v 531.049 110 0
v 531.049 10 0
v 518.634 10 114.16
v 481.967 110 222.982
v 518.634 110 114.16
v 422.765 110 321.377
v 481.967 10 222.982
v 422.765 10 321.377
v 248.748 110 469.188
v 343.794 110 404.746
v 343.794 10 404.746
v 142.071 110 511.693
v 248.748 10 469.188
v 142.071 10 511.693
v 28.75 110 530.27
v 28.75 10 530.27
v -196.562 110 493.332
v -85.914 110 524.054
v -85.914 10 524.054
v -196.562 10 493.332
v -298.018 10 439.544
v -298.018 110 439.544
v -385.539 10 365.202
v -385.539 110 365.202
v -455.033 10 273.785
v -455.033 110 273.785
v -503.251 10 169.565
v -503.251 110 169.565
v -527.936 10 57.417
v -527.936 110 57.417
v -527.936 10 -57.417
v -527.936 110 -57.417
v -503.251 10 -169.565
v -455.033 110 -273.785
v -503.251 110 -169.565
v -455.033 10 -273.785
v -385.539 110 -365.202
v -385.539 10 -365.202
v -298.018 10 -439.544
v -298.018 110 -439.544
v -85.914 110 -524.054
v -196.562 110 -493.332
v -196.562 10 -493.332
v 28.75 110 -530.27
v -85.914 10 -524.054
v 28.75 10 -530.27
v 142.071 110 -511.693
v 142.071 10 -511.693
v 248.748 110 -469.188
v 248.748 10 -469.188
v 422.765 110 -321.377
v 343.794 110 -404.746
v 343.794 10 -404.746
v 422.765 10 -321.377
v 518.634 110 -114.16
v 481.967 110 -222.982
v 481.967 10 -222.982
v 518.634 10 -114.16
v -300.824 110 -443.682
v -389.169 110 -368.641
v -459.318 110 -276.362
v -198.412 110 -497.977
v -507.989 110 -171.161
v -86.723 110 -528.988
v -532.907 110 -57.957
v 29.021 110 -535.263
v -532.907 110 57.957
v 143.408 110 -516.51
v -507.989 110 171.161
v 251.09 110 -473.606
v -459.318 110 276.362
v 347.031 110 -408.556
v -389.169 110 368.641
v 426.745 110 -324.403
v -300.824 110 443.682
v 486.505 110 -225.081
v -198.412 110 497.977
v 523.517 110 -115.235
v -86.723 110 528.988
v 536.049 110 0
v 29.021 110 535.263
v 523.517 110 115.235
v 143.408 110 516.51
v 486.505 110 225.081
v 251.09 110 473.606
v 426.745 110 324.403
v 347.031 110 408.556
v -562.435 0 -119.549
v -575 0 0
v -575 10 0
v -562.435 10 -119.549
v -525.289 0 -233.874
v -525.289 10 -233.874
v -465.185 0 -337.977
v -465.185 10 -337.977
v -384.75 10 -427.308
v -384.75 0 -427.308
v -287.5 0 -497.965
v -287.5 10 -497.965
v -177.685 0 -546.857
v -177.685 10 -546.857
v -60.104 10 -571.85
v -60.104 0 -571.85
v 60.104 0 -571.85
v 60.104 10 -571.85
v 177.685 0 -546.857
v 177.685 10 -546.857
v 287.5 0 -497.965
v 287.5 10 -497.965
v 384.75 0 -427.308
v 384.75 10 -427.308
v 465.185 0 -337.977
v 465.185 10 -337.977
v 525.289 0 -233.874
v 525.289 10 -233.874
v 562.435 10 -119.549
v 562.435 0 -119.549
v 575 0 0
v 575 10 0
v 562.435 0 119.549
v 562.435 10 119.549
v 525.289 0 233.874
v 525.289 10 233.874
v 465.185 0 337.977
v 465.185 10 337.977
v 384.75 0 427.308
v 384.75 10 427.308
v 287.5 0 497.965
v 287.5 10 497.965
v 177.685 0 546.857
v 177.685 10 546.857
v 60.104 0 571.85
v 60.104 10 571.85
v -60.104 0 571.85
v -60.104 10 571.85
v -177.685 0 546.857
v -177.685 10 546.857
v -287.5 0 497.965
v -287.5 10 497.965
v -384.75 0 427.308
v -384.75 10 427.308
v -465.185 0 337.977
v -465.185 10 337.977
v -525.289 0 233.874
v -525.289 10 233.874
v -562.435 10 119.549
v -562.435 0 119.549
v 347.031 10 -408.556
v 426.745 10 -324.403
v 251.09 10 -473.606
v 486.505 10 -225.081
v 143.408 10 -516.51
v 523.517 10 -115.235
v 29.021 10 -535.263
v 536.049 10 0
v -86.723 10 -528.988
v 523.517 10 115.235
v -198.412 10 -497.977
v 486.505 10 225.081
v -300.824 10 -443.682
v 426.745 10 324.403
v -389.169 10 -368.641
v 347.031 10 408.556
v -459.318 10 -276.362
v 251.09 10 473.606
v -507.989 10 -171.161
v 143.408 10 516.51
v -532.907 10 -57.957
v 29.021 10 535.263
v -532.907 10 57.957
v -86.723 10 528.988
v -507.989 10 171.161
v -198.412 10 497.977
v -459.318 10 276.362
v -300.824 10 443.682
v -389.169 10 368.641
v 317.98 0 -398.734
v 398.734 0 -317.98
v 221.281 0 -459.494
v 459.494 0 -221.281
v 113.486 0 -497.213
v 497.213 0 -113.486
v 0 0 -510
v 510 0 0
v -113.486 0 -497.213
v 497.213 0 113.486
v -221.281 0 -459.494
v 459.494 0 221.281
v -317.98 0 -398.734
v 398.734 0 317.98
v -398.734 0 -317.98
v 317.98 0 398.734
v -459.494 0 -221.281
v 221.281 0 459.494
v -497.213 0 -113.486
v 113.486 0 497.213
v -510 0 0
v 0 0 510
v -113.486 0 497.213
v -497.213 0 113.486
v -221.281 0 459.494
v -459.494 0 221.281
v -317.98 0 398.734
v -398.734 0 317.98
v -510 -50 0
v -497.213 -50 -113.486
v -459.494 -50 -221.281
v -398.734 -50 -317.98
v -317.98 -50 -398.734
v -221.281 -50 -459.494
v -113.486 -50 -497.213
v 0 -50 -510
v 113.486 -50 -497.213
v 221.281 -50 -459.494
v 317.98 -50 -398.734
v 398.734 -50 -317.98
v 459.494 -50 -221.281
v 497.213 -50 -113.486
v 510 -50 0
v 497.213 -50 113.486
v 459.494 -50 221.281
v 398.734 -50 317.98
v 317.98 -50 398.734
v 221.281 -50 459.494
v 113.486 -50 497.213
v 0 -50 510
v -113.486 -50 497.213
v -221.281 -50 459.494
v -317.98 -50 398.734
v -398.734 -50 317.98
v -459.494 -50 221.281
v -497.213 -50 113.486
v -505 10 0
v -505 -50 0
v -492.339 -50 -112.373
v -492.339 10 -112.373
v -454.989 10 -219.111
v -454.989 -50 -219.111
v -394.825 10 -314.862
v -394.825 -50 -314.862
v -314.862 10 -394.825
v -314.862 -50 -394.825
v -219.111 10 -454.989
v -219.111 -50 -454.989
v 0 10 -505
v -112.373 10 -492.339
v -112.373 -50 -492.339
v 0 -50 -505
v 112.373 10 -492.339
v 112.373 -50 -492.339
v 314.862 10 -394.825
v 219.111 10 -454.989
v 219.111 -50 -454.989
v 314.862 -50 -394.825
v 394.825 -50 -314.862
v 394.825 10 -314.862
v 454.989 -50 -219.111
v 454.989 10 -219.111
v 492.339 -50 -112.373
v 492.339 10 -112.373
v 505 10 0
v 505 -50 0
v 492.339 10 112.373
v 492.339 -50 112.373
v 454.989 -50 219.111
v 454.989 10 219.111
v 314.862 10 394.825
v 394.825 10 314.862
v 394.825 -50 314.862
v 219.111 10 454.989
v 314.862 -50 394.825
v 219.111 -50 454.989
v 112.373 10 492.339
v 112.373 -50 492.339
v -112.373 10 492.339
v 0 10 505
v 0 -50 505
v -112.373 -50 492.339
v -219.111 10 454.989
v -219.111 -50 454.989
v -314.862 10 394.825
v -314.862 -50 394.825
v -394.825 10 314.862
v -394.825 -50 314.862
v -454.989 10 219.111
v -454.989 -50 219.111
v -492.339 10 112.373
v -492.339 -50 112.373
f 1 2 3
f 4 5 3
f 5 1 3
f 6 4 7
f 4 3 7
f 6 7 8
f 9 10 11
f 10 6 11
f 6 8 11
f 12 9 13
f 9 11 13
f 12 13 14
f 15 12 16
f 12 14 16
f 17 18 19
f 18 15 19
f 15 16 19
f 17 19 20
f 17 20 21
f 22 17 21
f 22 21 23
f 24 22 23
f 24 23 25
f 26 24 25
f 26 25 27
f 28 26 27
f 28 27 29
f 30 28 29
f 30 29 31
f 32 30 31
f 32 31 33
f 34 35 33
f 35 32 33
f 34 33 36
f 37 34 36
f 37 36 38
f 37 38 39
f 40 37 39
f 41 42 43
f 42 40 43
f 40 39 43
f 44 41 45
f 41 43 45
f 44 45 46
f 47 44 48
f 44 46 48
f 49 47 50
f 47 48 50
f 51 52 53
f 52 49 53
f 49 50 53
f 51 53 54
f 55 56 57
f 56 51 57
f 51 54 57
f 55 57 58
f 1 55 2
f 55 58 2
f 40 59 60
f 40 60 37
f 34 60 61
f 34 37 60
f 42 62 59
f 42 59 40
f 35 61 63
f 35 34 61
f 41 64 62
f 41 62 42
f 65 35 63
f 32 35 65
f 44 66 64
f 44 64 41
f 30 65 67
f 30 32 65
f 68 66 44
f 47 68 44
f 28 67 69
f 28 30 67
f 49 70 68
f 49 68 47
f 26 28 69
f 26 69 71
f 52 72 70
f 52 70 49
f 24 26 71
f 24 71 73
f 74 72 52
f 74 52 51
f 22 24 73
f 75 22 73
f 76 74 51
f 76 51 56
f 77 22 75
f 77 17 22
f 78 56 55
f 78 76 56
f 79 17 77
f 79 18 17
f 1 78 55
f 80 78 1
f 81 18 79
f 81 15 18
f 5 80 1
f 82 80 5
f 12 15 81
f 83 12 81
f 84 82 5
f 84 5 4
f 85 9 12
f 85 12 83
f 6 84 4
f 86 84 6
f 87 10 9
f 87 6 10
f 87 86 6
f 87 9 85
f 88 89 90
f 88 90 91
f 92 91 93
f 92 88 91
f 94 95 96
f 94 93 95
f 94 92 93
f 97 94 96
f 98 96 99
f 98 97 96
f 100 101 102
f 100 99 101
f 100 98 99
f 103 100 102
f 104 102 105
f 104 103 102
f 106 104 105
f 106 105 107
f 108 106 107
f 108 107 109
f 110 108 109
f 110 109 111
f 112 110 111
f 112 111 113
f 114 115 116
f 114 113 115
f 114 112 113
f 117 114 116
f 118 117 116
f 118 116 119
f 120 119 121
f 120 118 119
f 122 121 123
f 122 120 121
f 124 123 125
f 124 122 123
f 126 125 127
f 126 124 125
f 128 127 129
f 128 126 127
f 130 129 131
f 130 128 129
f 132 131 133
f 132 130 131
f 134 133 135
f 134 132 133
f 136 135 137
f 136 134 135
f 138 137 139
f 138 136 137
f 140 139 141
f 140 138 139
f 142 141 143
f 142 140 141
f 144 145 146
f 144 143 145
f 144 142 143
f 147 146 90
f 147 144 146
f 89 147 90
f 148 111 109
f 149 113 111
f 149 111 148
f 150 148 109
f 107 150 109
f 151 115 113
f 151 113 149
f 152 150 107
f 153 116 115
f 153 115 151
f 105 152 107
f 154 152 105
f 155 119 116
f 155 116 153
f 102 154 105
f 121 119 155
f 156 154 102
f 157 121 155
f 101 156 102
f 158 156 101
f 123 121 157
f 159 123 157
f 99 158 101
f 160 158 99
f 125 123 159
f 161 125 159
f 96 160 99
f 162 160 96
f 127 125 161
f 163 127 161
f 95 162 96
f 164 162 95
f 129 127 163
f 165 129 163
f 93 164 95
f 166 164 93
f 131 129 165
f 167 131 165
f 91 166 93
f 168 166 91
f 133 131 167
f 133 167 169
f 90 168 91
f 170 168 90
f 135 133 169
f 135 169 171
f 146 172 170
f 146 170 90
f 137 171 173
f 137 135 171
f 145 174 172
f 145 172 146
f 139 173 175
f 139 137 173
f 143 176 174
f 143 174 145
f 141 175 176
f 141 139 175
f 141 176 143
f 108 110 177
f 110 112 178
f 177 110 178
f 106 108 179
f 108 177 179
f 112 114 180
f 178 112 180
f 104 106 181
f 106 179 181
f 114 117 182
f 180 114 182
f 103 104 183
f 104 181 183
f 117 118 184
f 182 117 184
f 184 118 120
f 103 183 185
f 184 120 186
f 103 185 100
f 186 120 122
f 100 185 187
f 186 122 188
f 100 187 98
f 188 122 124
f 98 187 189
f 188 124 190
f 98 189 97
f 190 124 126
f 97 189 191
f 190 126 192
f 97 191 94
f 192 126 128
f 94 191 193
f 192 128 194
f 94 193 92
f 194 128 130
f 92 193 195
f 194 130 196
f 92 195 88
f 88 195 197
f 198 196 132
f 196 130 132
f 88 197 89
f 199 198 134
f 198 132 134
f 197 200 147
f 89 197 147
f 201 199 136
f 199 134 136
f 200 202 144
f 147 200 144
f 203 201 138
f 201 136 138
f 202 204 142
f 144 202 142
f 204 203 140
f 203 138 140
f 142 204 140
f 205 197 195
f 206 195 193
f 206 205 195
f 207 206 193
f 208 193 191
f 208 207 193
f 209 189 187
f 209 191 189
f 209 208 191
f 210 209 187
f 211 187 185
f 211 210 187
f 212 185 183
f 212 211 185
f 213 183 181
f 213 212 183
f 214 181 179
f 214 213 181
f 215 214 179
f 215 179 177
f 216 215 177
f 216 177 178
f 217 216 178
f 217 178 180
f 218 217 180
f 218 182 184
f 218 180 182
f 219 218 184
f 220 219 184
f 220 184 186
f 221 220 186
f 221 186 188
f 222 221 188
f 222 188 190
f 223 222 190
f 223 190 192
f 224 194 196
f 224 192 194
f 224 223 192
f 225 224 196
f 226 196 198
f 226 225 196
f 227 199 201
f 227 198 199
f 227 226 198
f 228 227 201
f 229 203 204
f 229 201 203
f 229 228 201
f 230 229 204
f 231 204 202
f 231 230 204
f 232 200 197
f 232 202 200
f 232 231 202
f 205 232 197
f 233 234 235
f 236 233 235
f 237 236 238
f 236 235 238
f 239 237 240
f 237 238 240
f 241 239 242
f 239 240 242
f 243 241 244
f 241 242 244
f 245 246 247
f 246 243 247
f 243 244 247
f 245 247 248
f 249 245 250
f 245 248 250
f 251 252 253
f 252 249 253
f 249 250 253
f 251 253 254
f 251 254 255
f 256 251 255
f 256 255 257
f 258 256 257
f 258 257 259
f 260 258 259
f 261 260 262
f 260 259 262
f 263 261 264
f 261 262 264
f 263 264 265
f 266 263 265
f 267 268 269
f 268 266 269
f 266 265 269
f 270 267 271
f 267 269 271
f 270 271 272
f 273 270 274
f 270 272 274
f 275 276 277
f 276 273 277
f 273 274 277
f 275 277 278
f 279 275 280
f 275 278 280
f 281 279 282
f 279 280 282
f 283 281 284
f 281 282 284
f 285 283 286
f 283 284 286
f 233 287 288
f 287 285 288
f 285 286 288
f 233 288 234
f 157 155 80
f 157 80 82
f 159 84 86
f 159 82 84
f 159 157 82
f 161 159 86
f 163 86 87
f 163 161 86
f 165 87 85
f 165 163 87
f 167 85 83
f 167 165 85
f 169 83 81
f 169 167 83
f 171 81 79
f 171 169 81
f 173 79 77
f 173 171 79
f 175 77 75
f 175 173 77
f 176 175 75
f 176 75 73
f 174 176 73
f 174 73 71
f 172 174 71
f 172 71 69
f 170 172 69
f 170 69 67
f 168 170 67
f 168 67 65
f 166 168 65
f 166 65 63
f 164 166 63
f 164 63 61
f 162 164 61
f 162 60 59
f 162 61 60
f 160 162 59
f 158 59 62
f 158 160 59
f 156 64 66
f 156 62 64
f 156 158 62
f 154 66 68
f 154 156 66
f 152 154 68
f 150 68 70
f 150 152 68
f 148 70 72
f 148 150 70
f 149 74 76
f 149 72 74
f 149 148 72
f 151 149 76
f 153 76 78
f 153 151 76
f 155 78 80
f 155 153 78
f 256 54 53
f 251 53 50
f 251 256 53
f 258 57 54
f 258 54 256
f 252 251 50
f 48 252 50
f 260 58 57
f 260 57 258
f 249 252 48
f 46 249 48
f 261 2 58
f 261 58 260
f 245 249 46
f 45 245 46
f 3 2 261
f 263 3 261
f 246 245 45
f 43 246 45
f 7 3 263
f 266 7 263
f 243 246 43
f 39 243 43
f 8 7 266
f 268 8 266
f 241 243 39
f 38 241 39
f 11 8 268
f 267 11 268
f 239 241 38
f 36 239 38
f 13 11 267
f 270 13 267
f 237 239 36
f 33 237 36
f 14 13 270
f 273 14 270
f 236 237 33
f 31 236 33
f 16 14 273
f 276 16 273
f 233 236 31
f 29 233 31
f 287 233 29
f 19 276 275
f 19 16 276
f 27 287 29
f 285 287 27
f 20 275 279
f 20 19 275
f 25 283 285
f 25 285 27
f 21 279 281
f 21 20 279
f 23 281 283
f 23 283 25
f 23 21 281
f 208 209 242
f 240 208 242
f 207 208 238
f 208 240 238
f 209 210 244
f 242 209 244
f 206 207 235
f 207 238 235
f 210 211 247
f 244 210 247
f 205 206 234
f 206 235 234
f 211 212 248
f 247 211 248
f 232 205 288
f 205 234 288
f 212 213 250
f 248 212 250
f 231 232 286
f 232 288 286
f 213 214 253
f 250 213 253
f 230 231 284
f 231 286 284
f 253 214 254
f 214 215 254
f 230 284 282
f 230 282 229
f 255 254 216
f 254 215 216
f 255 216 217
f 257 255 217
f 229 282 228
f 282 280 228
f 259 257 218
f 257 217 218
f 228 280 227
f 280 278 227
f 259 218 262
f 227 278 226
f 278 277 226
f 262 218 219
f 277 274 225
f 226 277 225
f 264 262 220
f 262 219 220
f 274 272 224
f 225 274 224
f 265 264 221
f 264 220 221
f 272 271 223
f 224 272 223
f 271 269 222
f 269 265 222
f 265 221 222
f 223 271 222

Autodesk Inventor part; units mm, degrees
ref_plane "YZ Plane" through (0, 0, 0) normal (1, 0, 0) x (0, 1, 0)
ref_plane "XZ Plane" through (0, 0, 0) normal (0, 1, 0) x (-1, 0, 0)
ref_plane "XY Plane" through (0, 0, 0) normal (0, 0, 1) x (1, 0, 0)
sketch "草图1" plane through (0, 0, 0) normal (0, 1, 0) x (-1, 0, 0)
  circle A0 centre (0, 0) radius 575
  circle A1 centre (0, 0) radius 510
  dimension "d0" = 1150
  dimension "d1" = 1020
extrude "拉伸1" add sketch "草图1" along normal blind 10
sketch "草图2" plane through (0, 0, 0) normal (0, 1, 0) x (-1, 0, 0)
  circle A0 centre (0, 0) radius 510 projected
surface extrude "拉伸曲面1" sketch "草图2" along normal blind 10 and the other way blind 50 shown no curves A0
thicken "加厚1" operation add thickness 5 both sides no extend neighbours no toward (0.7479816, 0, 0.6637194) faces at (-381.4706, 6.6667, -338.4969) (-381.4706, -30, -338.4969)
sketch "草图3" plane through (0, 10, 0) normal (0, 1, 0) x (1, 0, 0)
  circle A0 centre (0, 0) radius 575 projected
  circle A1 centre (0, 0) radius 536.0493
surface extrude "拉伸曲面2" sketch "草图3" along normal blind 100 shown no curves A1
thicken "加厚2" operation add thickness 5 both sides no extend neighbours no toward (-0.9991732, 0, -0.0406567) faces at (535.606, 76.6667, 21.794)
sketch "草图4" plane through (0, 110, 0) normal (0, 1, 0) x (1, 0, 0)
  circle A0 centre (0, 0) radius 536.0493 projected
  circle A1 centre (0, 0) radius 531.0493 projected
  line L0 (531.0493, 0) -> (505.0579, -164.1032)
  line L1 (505.0579, -164.1032) -> (429.6279, -312.1429)
  line L2 (429.6279, -312.1429) -> (312.1429, -429.6279)
  line L3 (312.1429, -429.6279) -> (164.1032, -505.0579)
  line L4 (164.1032, -505.0579) -> (0, -531.0493)
  line L5 (0, -531.0493) -> (-164.1032, -505.0579)
  line L6 (-164.1032, -505.0579) -> (-312.1429, -429.6279)
  line L7 (-312.1429, -429.6279) -> (-429.6279, -312.1429)
  line L8 (-429.6279, -312.1429) -> (-505.0579, -164.1032)
  line L9 (-505.0579, -164.1032) -> (-531.0493, 0)
  line L10 (-531.0493, 0) -> (-505.0579, 164.1032)
  line L11 (-505.0579, 164.1032) -> (-429.6279, 312.1429)
  line L12 (-429.6279, 312.1429) -> (-312.1429, 429.6279)
  line L13 (-312.1429, 429.6279) -> (-164.1032, 505.0579)
  line L14 (-164.1032, 505.0579) -> (0, 531.0493)
  line L15 (0, 531.0493) -> (164.1032, 505.0579)
  line L16 (164.1032, 505.0579) -> (312.1429, 429.6279)
  line L17 (312.1429, 429.6279) -> (429.6279, 312.1429)
  line L18 (429.6279, 312.1429) -> (505.0579, 164.1032)
  line L19 (505.0579, 164.1032) -> (531.0493, 0)
  line L20 (-531.0493, 0) -> (531.0493, 0)
  line L21 (-505.0579, 164.1032) -> (-505.0579, -164.1032)
  line L22 (-429.6279, 312.1429) -> (-429.6279, -312.1429)
  line L23 (-312.1429, 429.6279) -> (-312.1429, -429.6279)
  line L24 (-164.1032, 505.0579) -> (-164.1032, -505.0579)
  line L25 (0, 531.0493) -> (0, -531.0493)
  line L26 (164.1032, 505.0579) -> (164.1032, -505.0579)
  line L27 (312.1429, -429.6279) -> (312.1429, 429.6279)
  line L28 (429.6279, 312.1429) -> (429.6279, -312.1429)
  line L29 (505.0579, -164.1032) -> (505.0579, 164.1032)
  line L30 (-164.1032, 505.0579) -> (164.1032, 505.0579)
  line L31 (312.1429, 429.6279) -> (-312.1429, 429.6279)
  line L32 (-429.6279, 312.1429) -> (429.6279, 312.1429)
  line L33 (505.0579, 164.1032) -> (-505.0579, 164.1032)
  line L34 (-505.0579, -164.1032) -> (505.0579, -164.1032)
  line L35 (-429.6279, -312.1429) -> (429.6279, -312.1429)
  line L36 (312.1429, -429.6279) -> (-312.1429, -435.7931)
  line L37 (-164.1032, -505.0579) -> (164.1032, -505.0579)
  line L38 (-312.1429, 429.6279) -> (-505.0579, 164.1032)
  line L39 (-505.0579, -164.1032) -> (-312.1429, -435.7931)
  line L40 (0, -531.0493) -> (-312.1429, -435.7931)
  line L41 (0, -531.0493) -> (312.1429, -429.6279)
  line L42 (312.1429, -429.6279) -> (505.0579, -164.1032)
  line L43 (505.0579, 164.1032) -> (312.1429, 429.6279)
  line L44 (312.1429, 429.6279) -> (0, 531.0493)
  line L45 (531.0493, 0) -> (-312.1429, -435.7931)
  line L46 (-312.1429, 429.6279) -> (531.0493, 0)
  line L47 (312.1429, 429.6279) -> (164.1032, -505.0579)
  line L48 (164.1032, -505.0579) -> (-505.0579, 164.1032)
  line L49 (-505.0579, 164.1032) -> (312.1429, 429.6279)
  line L50 (-429.6279, -312.1429) -> (429.6279, -312.1429)
  line L51 (0, 531.0493) -> (435.7931, -312.1429)
  line L52 (-429.6279, -312.1429) -> (0, 531.0493)
  line L53 (-312.1429, -429.6279) -> (505.0579, -164.1032)
  line L54 (-312.1429, -429.6279) -> (-164.1032, 505.0579)
  line L55 (-164.1032, 505.0579) -> (510.9213, -162.1981)
  line L56 (-505.9804, -165.9401) -> (161.2755, 509.0845)
  line L57 (428.7053, -313.9798) -> (-505.9804, -165.9401)
  line L58 (429.6279, -312.1429) -> (164.1032, 505.0579)
  line L59 (164.1032, -505.0579) -> (-505.0579, 164.1032)
  line L60 (-505.0579, 164.1032) -> (431.533, 318.0064)
  line L61 (164.1032, -505.0579) -> (429.6279, 312.1429)
  line L62 (-429.6279, 312.1429) -> (508.6817, 169.091)
  line L63 (0, -531.0493) -> (-429.6279, 312.1429)
  line L64 (0, -531.0493) -> (505.0579, 164.1032)
  line L65 (311.2203, -431.4647) -> (-536.9596, -5.4607)
  line L66 (164.1032, 505.0579) -> (-531.0493, 0)
  line L67 (163.1807, 503.221) -> (311.2203, -431.4647)
  line L68 (-316.3703, 426.5245) -> (535.9751, 8.9171)
  line L69 (-159.1077, -506.6538) -> (531.0234, 5.2442)
  line L70 (-159.1077, -506.6538) -> (-316.3703, 426.5245)
  line L71 (508.2003, -154.0967) -> (-425.1685, -326.4668)
  line L72 (-174.0458, 501.7184) -> (508.2003, -154.0967)
  line L73 (-174.0458, 501.7184) -> (-423.3795, -320.5669)
  line L74 (-111.947, 217.7208) -> (244.5252, -11.9114)
  line L75 (244.5252, -11.9114) -> (-132.5782, -205.8094)
  line L76 (-132.5782, -205.8094) -> (-111.947, 217.7208)
  line L77 (-210.9866, 63.9755) -> (160.8977, 150.7321)
  line L78 (160.8977, 150.7321) -> (50.0889, -214.7075)
  line L79 (50.0889, -214.7075) -> (-210.9866, 63.9755)
  line L80 (-231.596, -76.5164) -> (49.5329, 238.8263)
  line L81 (49.5329, 238.8263) -> (182.0632, -162.3098)
  line L82 (182.0632, -162.3098) -> (-231.596, -76.5164)
  line L83 (-178.3739, -185.5628) -> (-71.5151, 247.2577)
  line L84 (-71.5151, 247.2577) -> (249.889, -61.6949)
  line L85 (249.889, -61.6949) -> (-178.3739, -185.5628)
  line L86 (-84.545, -232.6889) -> (-159.242, 189.5626)
  line L87 (-159.242, 189.5626) -> (243.787, 43.1263)
  line L88 (243.787, 43.1263) -> (-84.545, -232.6889)
  line L89 (0, -247.9487) -> (-214.7299, 123.9744)
  line L90 (-214.7299, 123.9744) -> (214.7299, 123.9744)
  line L91 (214.7299, 123.9744) -> (0, -247.9487)
  line L92 (79.8324, -233.2057) -> (-241.8782, 47.466)
  line L93 (-241.8782, 47.466) -> (162.0458, 185.7397)
  line L94 (162.0458, 185.7397) -> (79.8324, -233.2057)
  line L95 (218.5126, -161.5306) -> (-249.1459, -108.4722)
  line L96 (-249.1459, -108.4722) -> (30.6333, 270.0028)
  line L97 (30.6333, 270.0028) -> (218.5126, -161.5306)
  point P0 (0, 0)
  point P1 (0, 0)
  point P2 (0, 0)
  point P3 (0, 0)
sketch "草图5" plane through (0, 10, 0) normal (0, 1, 0) x (1, 0, 0)
  circle A0 centre (0, 0) radius 531.0493 projected
  circle A1 centre (0, 0) radius 505 projected
  circle A2 centre (0, 0) radius 536.0493
  circle A3 centre (0, 0) radius 531.0493
  line L0 (531.0493, 0) -> (505.0579, -164.1032)
  line L1 (505.0579, -164.1032) -> (429.6279, -312.1429)
  line L2 (429.6279, -312.1429) -> (312.1429, -429.6279)
  line L3 (312.1429, -429.6279) -> (164.1032, -505.0579)
  line L4 (164.1032, -505.0579) -> (0, -531.0493)
  line L5 (0, -531.0493) -> (-164.1032, -505.0579)
  line L6 (-164.1032, -505.0579) -> (-312.1429, -429.6279)
  line L7 (-312.1429, -429.6279) -> (-429.6279, -312.1429)
  line L8 (-429.6279, -312.1429) -> (-505.0579, -164.1032)
  line L9 (-505.0579, -164.1032) -> (-531.0493, 0)
  line L10 (-531.0493, 0) -> (-505.0579, 164.1032)
  line L11 (-505.0579, 164.1032) -> (-429.6279, 312.1429)
  line L12 (-429.6279, 312.1429) -> (-312.1429, 429.6279)
  line L13 (-312.1429, 429.6279) -> (-164.1032, 505.0579)
  line L14 (-164.1032, 505.0579) -> (0, 531.0493)
  line L15 (0, 531.0493) -> (164.1032, 505.0579)
  line L16 (164.1032, 505.0579) -> (312.1429, 429.6279)
  line L17 (312.1429, 429.6279) -> (429.6279, 312.1429)
  line L18 (429.6279, 312.1429) -> (505.0579, 164.1032)
  line L19 (505.0579, 164.1032) -> (531.0493, 0)
  line L20 (-531.0493, 0) -> (531.0493, 0)
  line L21 (-505.0579, 164.1032) -> (-505.0579, -164.1032)
  line L22 (-429.6279, 312.1429) -> (-429.6279, -312.1429)
  line L23 (-312.1429, 429.6279) -> (-312.1429, -429.6279)
  line L24 (-164.1032, 505.0579) -> (-164.1032, -505.0579)
  line L25 (0, 531.0493) -> (0, -531.0493)
  line L26 (164.1032, 505.0579) -> (164.1032, -505.0579)
  line L27 (312.1429, -429.6279) -> (312.1429, 429.6279)
  line L28 (429.6279, 312.1429) -> (429.6279, -312.1429)
  line L29 (505.0579, -164.1032) -> (505.0579, 164.1032)
  line L30 (-164.1032, 505.0579) -> (164.1032, 505.0579)
  line L31 (312.1429, 429.6279) -> (-312.1429, 429.6279)
  line L32 (-429.6279, 312.1429) -> (429.6279, 312.1429)
  line L33 (505.0579, 164.1032) -> (-505.0579, 164.1032)
  line L34 (-505.0579, -164.1032) -> (505.0579, -164.1032)
  line L35 (-429.6279, -312.1429) -> (429.6279, -312.1429)
  line L36 (312.1429, -429.6279) -> (-312.1429, -435.7931)
  line L37 (-164.1032, -505.0579) -> (164.1032, -505.0579)
  line L38 (-312.1429, 429.6279) -> (-505.0579, 164.1032)
  line L39 (-505.0579, -164.1032) -> (-312.1429, -435.7931)
  line L40 (0, -531.0493) -> (-312.1429, -435.7931)
  line L41 (0, -531.0493) -> (312.1429, -429.6279)
  line L42 (312.1429, -429.6279) -> (505.0579, -164.1032)
  line L43 (505.0579, 164.1032) -> (312.1429, 429.6279)
  line L44 (312.1429, 429.6279) -> (0, 531.0493)
  line L45 (531.0493, 0) -> (-312.1429, -435.7931)
  line L46 (-312.1429, 429.6279) -> (531.0493, 0)
  line L47 (312.1429, 429.6279) -> (164.1032, -505.0579)
  line L48 (164.1032, -505.0579) -> (-505.0579, 164.1032)
  line L49 (-505.0579, 164.1032) -> (312.1429, 429.6279)
  line L50 (-429.6279, -312.1429) -> (429.6279, -312.1429)
  line L51 (-429.6279, -312.1429) -> (0, 531.0493)
  line L52 (0, 531.0493) -> (435.7931, -312.1429)
  line L53 (-164.1032, 505.0579) -> (510.9213, -162.1981)
  line L54 (-312.1429, -429.6279) -> (-164.1032, 505.0579)
  line L55 (-312.1429, -429.6279) -> (505.0579, -164.1032)
  line L56 (428.7053, -313.9798) -> (-505.9804, -165.9401)
  line L57 (-505.9804, -165.9401) -> (161.2755, 509.0845)
  line L58 (429.6279, -312.1429) -> (164.1032, 505.0579)
  line L59 (-505.0579, 164.1032) -> (431.533, 318.0064)
  line L60 (164.1032, -505.0579) -> (-505.0579, 164.1032)
  line L61 (164.1032, -505.0579) -> (429.6279, 312.1429)
  line L62 (-429.6279, 312.1429) -> (508.6817, 169.091)
  line L63 (0, -531.0493) -> (505.0579, 164.1032)
  line L64 (0, -531.0493) -> (-429.6279, 312.1429)
  line L65 (311.2203, -431.4647) -> (-536.9596, -5.4607)
  line L66 (164.1032, 505.0579) -> (-531.0493, 0)
  line L67 (163.1807, 503.221) -> (311.2203, -431.4647)
  line L68 (-316.3703, 426.5245) -> (535.9751, 8.9171)
  line L69 (-159.1077, -506.6538) -> (-316.3703, 426.5245)
  line L70 (-159.1077, -506.6538) -> (531.0234, 5.2442)
  line L71 (-174.0458, 501.7184) -> (-423.3795, -320.5669)
  line L72 (-174.0458, 501.7184) -> (508.2003, -154.0967)
  line L73 (508.2003, -154.0967) -> (-425.1685, -326.4668)
  line L74 (-111.947, 217.7208) -> (244.5252, -11.9114)
  line L75 (244.5252, -11.9114) -> (-132.5782, -205.8094)
  line L76 (-132.5782, -205.8094) -> (-111.947, 217.7208)
  line L77 (-210.9866, 63.9755) -> (160.8977, 150.7321)
  line L78 (160.8977, 150.7321) -> (50.0889, -214.7075)
  line L79 (50.0889, -214.7075) -> (-210.9866, 63.9755)
  line L80 (-231.596, -76.5164) -> (49.5329, 238.8263)
  line L81 (49.5329, 238.8263) -> (182.0632, -162.3098)
  line L82 (182.0632, -162.3098) -> (-231.596, -76.5164)
  line L83 (-178.3739, -185.5628) -> (-71.5151, 247.2577)
  line L84 (-71.5151, 247.2577) -> (249.889, -61.6949)
  line L85 (249.889, -61.6949) -> (-178.3739, -185.5628)
  line L86 (-84.545, -232.6889) -> (-159.242, 189.5626)
  line L87 (-159.242, 189.5626) -> (243.787, 43.1263)
  line L88 (243.787, 43.1263) -> (-84.545, -232.6889)
  line L89 (0, -247.9487) -> (-214.7299, 123.9744)
  line L90 (-214.7299, 123.9744) -> (214.7299, 123.9744)
  line L91 (214.7299, 123.9744) -> (0, -247.9487)
  line L92 (79.8324, -233.2057) -> (-241.8782, 47.466)
  line L93 (-241.8782, 47.466) -> (162.0458, 185.7397)
  line L94 (162.0458, 185.7397) -> (79.8324, -233.2057)
  line L95 (218.5126, -161.5306) -> (-249.1459, -108.4722)
  line L96 (-249.1459, -108.4722) -> (30.6333, 270.0028)
  line L97 (30.6333, 270.0028) -> (218.5126, -161.5306)
  point P0 (0, 0)
  point P1 (0, 0)
  point P2 (0, 0)
  point P3 (0, 0)
properties part number "除沫器"
